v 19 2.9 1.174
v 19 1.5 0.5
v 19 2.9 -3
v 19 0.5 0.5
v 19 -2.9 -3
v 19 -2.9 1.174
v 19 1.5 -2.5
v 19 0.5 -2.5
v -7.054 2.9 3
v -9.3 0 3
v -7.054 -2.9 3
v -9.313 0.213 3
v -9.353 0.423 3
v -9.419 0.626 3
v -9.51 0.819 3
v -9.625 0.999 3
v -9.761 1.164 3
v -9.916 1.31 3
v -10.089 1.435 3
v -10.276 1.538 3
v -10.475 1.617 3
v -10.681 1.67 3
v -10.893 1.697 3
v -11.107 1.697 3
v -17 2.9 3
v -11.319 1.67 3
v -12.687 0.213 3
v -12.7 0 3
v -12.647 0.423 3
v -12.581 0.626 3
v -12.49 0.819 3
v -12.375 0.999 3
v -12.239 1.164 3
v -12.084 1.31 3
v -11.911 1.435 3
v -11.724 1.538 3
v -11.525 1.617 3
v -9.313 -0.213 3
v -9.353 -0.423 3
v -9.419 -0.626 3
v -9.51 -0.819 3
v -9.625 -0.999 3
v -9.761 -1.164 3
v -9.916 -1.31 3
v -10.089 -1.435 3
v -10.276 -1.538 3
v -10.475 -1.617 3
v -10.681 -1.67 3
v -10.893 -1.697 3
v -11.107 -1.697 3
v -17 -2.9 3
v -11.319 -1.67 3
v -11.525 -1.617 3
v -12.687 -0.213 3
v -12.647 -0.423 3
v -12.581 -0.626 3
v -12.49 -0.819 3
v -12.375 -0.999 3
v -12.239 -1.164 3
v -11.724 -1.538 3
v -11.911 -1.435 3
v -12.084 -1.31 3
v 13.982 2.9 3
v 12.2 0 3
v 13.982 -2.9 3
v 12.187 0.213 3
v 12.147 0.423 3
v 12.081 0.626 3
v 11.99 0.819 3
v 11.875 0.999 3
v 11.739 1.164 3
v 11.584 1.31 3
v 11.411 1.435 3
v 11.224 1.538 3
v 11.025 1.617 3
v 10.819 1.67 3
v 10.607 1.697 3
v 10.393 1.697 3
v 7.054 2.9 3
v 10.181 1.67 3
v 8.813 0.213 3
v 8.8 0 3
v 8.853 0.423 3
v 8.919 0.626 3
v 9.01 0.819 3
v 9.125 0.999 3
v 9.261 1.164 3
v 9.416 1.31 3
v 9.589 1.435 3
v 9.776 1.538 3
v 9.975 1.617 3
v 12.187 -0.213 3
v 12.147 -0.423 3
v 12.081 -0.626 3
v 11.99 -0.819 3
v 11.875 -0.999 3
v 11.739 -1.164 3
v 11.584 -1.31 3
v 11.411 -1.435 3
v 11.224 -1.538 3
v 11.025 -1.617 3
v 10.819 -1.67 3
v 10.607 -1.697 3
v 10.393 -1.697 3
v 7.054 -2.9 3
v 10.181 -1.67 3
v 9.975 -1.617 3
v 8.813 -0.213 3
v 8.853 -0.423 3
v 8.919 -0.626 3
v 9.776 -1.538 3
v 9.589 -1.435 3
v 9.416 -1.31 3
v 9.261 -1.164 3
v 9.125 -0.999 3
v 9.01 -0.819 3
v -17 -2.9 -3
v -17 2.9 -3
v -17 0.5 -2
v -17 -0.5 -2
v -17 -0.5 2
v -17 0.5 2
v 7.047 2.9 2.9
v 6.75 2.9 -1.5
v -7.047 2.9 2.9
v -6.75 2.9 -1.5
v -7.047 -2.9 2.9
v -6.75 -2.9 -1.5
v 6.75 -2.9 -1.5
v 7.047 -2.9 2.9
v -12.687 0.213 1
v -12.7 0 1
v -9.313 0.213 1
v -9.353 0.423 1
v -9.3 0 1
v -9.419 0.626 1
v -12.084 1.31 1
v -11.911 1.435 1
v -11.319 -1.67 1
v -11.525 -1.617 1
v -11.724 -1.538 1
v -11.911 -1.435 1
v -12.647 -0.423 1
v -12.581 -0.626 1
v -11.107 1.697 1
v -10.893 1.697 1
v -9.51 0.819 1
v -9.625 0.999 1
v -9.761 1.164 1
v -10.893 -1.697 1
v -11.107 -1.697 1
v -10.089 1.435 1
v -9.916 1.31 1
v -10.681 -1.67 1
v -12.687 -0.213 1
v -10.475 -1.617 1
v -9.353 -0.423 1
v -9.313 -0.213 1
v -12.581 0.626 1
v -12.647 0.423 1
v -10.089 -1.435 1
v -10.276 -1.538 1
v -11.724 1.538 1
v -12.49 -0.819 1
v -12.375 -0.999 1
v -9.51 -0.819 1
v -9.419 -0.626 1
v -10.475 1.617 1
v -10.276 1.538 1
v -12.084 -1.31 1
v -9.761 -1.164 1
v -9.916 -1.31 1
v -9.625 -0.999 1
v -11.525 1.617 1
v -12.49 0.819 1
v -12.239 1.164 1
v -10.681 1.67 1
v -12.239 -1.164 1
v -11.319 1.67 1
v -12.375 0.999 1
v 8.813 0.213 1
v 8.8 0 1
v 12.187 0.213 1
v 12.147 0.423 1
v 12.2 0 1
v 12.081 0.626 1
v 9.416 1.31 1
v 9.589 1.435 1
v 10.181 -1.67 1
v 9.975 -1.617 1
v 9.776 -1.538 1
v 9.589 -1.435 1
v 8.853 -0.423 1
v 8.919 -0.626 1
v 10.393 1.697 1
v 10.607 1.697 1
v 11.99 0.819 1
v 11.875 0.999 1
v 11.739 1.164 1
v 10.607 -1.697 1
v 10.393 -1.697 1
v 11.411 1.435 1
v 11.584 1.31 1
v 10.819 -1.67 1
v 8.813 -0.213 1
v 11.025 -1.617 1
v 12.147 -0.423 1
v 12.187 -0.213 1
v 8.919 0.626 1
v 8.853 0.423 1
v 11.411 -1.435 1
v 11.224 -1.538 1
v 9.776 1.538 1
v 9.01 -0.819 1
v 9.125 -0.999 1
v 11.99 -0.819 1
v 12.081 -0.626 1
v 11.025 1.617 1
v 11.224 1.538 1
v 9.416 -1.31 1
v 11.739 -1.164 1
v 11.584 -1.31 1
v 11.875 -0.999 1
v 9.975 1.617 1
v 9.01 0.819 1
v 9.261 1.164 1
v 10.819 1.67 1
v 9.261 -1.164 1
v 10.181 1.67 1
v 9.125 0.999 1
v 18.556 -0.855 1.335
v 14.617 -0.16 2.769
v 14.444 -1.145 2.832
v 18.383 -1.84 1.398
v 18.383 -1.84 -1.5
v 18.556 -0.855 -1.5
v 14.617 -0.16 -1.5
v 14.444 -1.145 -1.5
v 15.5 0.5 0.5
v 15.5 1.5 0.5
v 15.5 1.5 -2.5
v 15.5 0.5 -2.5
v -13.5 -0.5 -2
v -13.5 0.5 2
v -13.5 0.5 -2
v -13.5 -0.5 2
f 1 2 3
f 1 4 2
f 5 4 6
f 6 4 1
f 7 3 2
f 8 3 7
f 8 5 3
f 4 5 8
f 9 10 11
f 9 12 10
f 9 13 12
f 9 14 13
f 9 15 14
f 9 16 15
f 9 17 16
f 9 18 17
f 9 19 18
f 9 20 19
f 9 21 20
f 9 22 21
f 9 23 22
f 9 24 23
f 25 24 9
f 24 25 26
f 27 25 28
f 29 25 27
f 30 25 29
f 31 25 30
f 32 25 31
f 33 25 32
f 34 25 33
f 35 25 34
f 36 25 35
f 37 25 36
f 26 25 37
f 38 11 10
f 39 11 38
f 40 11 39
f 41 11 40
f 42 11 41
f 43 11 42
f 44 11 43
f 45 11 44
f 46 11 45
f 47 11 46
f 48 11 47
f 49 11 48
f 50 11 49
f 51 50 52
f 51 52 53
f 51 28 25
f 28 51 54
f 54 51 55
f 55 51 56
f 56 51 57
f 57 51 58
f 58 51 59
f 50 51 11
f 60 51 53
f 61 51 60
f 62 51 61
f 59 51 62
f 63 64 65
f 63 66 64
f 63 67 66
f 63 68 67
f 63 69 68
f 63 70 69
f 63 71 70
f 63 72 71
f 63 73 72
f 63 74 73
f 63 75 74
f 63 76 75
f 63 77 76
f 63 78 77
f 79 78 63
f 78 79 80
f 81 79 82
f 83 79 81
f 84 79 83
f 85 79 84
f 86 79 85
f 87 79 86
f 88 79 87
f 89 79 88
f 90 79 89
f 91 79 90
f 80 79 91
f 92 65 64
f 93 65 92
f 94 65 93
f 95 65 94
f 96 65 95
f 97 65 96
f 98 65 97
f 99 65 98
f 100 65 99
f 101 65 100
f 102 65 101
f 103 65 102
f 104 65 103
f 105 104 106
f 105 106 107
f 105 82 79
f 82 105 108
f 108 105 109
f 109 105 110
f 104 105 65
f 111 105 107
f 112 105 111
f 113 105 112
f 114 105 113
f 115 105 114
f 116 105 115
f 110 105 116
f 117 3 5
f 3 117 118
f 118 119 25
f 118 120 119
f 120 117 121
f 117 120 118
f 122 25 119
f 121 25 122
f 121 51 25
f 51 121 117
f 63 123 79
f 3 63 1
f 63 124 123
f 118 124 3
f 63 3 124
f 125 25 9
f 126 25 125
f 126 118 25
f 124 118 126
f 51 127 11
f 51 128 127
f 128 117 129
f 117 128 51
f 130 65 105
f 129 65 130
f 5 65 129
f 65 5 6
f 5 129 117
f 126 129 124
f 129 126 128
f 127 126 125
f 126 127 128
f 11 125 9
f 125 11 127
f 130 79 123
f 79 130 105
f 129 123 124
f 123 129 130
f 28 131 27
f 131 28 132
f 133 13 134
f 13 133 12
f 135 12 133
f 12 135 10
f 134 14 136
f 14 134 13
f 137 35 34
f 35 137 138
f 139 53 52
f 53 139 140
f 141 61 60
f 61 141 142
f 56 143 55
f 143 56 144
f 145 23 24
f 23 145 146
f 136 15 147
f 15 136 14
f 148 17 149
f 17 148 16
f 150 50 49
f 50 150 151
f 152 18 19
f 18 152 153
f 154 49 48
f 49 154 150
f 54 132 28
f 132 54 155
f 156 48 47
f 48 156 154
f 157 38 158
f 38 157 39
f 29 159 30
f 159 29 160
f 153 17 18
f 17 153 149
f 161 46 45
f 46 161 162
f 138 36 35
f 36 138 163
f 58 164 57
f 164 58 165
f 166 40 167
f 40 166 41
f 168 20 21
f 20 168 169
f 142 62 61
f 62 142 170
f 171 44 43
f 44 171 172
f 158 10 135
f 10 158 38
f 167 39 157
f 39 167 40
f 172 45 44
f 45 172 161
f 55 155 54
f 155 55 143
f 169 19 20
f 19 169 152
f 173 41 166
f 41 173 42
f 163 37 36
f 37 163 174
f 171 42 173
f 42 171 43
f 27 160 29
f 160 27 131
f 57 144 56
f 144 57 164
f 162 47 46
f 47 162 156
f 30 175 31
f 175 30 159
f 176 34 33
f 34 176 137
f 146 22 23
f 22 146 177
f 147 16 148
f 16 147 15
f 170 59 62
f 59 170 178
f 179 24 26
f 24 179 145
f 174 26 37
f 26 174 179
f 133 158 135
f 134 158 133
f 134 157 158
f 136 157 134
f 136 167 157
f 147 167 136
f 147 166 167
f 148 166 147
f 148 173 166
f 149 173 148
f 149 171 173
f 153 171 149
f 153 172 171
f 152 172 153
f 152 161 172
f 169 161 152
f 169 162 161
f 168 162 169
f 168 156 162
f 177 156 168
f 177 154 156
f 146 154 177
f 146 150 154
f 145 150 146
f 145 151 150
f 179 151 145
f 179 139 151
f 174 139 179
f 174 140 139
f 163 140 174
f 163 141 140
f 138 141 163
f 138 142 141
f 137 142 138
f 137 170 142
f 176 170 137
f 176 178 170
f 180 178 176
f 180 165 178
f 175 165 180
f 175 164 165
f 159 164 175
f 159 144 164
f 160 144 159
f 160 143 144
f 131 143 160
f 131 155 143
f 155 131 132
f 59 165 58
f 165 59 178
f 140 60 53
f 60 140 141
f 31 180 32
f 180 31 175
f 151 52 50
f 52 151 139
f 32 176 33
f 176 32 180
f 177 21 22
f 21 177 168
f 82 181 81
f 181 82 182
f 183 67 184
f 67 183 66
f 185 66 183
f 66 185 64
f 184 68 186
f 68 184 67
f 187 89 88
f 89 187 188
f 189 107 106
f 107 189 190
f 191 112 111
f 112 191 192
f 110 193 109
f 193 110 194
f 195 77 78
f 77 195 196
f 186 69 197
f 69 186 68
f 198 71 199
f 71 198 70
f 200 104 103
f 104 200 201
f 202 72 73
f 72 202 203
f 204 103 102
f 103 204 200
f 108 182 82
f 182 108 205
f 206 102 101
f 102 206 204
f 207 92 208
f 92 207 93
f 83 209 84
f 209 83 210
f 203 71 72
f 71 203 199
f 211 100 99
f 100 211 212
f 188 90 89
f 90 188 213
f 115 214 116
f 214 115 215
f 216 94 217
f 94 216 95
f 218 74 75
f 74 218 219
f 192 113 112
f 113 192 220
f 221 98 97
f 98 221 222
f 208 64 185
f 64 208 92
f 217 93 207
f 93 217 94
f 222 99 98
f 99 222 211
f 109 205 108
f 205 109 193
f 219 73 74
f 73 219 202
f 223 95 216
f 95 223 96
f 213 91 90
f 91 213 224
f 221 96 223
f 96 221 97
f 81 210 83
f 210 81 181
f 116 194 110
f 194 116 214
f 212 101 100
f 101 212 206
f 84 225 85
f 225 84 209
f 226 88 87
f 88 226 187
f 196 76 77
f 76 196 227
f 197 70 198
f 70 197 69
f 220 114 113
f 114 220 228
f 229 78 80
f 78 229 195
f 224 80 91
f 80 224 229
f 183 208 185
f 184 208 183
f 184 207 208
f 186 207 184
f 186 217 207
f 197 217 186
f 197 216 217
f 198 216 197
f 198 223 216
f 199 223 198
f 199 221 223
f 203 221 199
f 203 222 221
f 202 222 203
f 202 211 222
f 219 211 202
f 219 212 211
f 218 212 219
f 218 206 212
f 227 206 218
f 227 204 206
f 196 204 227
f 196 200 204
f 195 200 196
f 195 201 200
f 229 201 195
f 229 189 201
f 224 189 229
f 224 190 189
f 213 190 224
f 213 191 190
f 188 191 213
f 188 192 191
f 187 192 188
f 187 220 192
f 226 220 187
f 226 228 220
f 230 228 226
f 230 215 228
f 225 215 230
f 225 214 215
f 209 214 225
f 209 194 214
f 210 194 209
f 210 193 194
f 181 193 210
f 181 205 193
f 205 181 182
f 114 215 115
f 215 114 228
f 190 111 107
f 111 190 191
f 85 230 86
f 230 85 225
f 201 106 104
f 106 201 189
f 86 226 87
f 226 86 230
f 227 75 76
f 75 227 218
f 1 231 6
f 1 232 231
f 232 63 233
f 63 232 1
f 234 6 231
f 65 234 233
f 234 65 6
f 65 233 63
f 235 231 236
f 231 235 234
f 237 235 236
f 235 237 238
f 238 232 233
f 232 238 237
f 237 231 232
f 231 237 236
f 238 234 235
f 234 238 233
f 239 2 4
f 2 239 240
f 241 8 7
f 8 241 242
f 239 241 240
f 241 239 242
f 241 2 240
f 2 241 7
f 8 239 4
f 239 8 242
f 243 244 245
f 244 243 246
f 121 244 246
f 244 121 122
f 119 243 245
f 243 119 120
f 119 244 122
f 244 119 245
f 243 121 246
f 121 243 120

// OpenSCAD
$fn=50;

difference() {
  translate([1, 0, 0])
  cube([36, 5.8, 6], center=true);

  translate([0, 0, -1.5])
  linear_extrude(height=5, scale=[1.05, 1])
  square([13.5, 7], center=true);

  translate([-11, 0, 2.25])
  cylinder(h=2.5, d=3.4, center=true);

  translate([10.5, 0, 2.25])
  cylinder(h=2.5, d=3.4, center=true);

  translate([18, 0, 3.4])
  rotate([0, 20, 0])
  cube([10, 7, 3.5], center=true);

  translate([16.5, -1, 2])
  rotate([0, 0, -10])
  cube([4, 1, 7], center=true);

  translate([18, 1, -1])
  cube([5, 1, 3], center=true);

  translate([-16, 0, 0])
  cube([5, 1, 4], center=true);
}
